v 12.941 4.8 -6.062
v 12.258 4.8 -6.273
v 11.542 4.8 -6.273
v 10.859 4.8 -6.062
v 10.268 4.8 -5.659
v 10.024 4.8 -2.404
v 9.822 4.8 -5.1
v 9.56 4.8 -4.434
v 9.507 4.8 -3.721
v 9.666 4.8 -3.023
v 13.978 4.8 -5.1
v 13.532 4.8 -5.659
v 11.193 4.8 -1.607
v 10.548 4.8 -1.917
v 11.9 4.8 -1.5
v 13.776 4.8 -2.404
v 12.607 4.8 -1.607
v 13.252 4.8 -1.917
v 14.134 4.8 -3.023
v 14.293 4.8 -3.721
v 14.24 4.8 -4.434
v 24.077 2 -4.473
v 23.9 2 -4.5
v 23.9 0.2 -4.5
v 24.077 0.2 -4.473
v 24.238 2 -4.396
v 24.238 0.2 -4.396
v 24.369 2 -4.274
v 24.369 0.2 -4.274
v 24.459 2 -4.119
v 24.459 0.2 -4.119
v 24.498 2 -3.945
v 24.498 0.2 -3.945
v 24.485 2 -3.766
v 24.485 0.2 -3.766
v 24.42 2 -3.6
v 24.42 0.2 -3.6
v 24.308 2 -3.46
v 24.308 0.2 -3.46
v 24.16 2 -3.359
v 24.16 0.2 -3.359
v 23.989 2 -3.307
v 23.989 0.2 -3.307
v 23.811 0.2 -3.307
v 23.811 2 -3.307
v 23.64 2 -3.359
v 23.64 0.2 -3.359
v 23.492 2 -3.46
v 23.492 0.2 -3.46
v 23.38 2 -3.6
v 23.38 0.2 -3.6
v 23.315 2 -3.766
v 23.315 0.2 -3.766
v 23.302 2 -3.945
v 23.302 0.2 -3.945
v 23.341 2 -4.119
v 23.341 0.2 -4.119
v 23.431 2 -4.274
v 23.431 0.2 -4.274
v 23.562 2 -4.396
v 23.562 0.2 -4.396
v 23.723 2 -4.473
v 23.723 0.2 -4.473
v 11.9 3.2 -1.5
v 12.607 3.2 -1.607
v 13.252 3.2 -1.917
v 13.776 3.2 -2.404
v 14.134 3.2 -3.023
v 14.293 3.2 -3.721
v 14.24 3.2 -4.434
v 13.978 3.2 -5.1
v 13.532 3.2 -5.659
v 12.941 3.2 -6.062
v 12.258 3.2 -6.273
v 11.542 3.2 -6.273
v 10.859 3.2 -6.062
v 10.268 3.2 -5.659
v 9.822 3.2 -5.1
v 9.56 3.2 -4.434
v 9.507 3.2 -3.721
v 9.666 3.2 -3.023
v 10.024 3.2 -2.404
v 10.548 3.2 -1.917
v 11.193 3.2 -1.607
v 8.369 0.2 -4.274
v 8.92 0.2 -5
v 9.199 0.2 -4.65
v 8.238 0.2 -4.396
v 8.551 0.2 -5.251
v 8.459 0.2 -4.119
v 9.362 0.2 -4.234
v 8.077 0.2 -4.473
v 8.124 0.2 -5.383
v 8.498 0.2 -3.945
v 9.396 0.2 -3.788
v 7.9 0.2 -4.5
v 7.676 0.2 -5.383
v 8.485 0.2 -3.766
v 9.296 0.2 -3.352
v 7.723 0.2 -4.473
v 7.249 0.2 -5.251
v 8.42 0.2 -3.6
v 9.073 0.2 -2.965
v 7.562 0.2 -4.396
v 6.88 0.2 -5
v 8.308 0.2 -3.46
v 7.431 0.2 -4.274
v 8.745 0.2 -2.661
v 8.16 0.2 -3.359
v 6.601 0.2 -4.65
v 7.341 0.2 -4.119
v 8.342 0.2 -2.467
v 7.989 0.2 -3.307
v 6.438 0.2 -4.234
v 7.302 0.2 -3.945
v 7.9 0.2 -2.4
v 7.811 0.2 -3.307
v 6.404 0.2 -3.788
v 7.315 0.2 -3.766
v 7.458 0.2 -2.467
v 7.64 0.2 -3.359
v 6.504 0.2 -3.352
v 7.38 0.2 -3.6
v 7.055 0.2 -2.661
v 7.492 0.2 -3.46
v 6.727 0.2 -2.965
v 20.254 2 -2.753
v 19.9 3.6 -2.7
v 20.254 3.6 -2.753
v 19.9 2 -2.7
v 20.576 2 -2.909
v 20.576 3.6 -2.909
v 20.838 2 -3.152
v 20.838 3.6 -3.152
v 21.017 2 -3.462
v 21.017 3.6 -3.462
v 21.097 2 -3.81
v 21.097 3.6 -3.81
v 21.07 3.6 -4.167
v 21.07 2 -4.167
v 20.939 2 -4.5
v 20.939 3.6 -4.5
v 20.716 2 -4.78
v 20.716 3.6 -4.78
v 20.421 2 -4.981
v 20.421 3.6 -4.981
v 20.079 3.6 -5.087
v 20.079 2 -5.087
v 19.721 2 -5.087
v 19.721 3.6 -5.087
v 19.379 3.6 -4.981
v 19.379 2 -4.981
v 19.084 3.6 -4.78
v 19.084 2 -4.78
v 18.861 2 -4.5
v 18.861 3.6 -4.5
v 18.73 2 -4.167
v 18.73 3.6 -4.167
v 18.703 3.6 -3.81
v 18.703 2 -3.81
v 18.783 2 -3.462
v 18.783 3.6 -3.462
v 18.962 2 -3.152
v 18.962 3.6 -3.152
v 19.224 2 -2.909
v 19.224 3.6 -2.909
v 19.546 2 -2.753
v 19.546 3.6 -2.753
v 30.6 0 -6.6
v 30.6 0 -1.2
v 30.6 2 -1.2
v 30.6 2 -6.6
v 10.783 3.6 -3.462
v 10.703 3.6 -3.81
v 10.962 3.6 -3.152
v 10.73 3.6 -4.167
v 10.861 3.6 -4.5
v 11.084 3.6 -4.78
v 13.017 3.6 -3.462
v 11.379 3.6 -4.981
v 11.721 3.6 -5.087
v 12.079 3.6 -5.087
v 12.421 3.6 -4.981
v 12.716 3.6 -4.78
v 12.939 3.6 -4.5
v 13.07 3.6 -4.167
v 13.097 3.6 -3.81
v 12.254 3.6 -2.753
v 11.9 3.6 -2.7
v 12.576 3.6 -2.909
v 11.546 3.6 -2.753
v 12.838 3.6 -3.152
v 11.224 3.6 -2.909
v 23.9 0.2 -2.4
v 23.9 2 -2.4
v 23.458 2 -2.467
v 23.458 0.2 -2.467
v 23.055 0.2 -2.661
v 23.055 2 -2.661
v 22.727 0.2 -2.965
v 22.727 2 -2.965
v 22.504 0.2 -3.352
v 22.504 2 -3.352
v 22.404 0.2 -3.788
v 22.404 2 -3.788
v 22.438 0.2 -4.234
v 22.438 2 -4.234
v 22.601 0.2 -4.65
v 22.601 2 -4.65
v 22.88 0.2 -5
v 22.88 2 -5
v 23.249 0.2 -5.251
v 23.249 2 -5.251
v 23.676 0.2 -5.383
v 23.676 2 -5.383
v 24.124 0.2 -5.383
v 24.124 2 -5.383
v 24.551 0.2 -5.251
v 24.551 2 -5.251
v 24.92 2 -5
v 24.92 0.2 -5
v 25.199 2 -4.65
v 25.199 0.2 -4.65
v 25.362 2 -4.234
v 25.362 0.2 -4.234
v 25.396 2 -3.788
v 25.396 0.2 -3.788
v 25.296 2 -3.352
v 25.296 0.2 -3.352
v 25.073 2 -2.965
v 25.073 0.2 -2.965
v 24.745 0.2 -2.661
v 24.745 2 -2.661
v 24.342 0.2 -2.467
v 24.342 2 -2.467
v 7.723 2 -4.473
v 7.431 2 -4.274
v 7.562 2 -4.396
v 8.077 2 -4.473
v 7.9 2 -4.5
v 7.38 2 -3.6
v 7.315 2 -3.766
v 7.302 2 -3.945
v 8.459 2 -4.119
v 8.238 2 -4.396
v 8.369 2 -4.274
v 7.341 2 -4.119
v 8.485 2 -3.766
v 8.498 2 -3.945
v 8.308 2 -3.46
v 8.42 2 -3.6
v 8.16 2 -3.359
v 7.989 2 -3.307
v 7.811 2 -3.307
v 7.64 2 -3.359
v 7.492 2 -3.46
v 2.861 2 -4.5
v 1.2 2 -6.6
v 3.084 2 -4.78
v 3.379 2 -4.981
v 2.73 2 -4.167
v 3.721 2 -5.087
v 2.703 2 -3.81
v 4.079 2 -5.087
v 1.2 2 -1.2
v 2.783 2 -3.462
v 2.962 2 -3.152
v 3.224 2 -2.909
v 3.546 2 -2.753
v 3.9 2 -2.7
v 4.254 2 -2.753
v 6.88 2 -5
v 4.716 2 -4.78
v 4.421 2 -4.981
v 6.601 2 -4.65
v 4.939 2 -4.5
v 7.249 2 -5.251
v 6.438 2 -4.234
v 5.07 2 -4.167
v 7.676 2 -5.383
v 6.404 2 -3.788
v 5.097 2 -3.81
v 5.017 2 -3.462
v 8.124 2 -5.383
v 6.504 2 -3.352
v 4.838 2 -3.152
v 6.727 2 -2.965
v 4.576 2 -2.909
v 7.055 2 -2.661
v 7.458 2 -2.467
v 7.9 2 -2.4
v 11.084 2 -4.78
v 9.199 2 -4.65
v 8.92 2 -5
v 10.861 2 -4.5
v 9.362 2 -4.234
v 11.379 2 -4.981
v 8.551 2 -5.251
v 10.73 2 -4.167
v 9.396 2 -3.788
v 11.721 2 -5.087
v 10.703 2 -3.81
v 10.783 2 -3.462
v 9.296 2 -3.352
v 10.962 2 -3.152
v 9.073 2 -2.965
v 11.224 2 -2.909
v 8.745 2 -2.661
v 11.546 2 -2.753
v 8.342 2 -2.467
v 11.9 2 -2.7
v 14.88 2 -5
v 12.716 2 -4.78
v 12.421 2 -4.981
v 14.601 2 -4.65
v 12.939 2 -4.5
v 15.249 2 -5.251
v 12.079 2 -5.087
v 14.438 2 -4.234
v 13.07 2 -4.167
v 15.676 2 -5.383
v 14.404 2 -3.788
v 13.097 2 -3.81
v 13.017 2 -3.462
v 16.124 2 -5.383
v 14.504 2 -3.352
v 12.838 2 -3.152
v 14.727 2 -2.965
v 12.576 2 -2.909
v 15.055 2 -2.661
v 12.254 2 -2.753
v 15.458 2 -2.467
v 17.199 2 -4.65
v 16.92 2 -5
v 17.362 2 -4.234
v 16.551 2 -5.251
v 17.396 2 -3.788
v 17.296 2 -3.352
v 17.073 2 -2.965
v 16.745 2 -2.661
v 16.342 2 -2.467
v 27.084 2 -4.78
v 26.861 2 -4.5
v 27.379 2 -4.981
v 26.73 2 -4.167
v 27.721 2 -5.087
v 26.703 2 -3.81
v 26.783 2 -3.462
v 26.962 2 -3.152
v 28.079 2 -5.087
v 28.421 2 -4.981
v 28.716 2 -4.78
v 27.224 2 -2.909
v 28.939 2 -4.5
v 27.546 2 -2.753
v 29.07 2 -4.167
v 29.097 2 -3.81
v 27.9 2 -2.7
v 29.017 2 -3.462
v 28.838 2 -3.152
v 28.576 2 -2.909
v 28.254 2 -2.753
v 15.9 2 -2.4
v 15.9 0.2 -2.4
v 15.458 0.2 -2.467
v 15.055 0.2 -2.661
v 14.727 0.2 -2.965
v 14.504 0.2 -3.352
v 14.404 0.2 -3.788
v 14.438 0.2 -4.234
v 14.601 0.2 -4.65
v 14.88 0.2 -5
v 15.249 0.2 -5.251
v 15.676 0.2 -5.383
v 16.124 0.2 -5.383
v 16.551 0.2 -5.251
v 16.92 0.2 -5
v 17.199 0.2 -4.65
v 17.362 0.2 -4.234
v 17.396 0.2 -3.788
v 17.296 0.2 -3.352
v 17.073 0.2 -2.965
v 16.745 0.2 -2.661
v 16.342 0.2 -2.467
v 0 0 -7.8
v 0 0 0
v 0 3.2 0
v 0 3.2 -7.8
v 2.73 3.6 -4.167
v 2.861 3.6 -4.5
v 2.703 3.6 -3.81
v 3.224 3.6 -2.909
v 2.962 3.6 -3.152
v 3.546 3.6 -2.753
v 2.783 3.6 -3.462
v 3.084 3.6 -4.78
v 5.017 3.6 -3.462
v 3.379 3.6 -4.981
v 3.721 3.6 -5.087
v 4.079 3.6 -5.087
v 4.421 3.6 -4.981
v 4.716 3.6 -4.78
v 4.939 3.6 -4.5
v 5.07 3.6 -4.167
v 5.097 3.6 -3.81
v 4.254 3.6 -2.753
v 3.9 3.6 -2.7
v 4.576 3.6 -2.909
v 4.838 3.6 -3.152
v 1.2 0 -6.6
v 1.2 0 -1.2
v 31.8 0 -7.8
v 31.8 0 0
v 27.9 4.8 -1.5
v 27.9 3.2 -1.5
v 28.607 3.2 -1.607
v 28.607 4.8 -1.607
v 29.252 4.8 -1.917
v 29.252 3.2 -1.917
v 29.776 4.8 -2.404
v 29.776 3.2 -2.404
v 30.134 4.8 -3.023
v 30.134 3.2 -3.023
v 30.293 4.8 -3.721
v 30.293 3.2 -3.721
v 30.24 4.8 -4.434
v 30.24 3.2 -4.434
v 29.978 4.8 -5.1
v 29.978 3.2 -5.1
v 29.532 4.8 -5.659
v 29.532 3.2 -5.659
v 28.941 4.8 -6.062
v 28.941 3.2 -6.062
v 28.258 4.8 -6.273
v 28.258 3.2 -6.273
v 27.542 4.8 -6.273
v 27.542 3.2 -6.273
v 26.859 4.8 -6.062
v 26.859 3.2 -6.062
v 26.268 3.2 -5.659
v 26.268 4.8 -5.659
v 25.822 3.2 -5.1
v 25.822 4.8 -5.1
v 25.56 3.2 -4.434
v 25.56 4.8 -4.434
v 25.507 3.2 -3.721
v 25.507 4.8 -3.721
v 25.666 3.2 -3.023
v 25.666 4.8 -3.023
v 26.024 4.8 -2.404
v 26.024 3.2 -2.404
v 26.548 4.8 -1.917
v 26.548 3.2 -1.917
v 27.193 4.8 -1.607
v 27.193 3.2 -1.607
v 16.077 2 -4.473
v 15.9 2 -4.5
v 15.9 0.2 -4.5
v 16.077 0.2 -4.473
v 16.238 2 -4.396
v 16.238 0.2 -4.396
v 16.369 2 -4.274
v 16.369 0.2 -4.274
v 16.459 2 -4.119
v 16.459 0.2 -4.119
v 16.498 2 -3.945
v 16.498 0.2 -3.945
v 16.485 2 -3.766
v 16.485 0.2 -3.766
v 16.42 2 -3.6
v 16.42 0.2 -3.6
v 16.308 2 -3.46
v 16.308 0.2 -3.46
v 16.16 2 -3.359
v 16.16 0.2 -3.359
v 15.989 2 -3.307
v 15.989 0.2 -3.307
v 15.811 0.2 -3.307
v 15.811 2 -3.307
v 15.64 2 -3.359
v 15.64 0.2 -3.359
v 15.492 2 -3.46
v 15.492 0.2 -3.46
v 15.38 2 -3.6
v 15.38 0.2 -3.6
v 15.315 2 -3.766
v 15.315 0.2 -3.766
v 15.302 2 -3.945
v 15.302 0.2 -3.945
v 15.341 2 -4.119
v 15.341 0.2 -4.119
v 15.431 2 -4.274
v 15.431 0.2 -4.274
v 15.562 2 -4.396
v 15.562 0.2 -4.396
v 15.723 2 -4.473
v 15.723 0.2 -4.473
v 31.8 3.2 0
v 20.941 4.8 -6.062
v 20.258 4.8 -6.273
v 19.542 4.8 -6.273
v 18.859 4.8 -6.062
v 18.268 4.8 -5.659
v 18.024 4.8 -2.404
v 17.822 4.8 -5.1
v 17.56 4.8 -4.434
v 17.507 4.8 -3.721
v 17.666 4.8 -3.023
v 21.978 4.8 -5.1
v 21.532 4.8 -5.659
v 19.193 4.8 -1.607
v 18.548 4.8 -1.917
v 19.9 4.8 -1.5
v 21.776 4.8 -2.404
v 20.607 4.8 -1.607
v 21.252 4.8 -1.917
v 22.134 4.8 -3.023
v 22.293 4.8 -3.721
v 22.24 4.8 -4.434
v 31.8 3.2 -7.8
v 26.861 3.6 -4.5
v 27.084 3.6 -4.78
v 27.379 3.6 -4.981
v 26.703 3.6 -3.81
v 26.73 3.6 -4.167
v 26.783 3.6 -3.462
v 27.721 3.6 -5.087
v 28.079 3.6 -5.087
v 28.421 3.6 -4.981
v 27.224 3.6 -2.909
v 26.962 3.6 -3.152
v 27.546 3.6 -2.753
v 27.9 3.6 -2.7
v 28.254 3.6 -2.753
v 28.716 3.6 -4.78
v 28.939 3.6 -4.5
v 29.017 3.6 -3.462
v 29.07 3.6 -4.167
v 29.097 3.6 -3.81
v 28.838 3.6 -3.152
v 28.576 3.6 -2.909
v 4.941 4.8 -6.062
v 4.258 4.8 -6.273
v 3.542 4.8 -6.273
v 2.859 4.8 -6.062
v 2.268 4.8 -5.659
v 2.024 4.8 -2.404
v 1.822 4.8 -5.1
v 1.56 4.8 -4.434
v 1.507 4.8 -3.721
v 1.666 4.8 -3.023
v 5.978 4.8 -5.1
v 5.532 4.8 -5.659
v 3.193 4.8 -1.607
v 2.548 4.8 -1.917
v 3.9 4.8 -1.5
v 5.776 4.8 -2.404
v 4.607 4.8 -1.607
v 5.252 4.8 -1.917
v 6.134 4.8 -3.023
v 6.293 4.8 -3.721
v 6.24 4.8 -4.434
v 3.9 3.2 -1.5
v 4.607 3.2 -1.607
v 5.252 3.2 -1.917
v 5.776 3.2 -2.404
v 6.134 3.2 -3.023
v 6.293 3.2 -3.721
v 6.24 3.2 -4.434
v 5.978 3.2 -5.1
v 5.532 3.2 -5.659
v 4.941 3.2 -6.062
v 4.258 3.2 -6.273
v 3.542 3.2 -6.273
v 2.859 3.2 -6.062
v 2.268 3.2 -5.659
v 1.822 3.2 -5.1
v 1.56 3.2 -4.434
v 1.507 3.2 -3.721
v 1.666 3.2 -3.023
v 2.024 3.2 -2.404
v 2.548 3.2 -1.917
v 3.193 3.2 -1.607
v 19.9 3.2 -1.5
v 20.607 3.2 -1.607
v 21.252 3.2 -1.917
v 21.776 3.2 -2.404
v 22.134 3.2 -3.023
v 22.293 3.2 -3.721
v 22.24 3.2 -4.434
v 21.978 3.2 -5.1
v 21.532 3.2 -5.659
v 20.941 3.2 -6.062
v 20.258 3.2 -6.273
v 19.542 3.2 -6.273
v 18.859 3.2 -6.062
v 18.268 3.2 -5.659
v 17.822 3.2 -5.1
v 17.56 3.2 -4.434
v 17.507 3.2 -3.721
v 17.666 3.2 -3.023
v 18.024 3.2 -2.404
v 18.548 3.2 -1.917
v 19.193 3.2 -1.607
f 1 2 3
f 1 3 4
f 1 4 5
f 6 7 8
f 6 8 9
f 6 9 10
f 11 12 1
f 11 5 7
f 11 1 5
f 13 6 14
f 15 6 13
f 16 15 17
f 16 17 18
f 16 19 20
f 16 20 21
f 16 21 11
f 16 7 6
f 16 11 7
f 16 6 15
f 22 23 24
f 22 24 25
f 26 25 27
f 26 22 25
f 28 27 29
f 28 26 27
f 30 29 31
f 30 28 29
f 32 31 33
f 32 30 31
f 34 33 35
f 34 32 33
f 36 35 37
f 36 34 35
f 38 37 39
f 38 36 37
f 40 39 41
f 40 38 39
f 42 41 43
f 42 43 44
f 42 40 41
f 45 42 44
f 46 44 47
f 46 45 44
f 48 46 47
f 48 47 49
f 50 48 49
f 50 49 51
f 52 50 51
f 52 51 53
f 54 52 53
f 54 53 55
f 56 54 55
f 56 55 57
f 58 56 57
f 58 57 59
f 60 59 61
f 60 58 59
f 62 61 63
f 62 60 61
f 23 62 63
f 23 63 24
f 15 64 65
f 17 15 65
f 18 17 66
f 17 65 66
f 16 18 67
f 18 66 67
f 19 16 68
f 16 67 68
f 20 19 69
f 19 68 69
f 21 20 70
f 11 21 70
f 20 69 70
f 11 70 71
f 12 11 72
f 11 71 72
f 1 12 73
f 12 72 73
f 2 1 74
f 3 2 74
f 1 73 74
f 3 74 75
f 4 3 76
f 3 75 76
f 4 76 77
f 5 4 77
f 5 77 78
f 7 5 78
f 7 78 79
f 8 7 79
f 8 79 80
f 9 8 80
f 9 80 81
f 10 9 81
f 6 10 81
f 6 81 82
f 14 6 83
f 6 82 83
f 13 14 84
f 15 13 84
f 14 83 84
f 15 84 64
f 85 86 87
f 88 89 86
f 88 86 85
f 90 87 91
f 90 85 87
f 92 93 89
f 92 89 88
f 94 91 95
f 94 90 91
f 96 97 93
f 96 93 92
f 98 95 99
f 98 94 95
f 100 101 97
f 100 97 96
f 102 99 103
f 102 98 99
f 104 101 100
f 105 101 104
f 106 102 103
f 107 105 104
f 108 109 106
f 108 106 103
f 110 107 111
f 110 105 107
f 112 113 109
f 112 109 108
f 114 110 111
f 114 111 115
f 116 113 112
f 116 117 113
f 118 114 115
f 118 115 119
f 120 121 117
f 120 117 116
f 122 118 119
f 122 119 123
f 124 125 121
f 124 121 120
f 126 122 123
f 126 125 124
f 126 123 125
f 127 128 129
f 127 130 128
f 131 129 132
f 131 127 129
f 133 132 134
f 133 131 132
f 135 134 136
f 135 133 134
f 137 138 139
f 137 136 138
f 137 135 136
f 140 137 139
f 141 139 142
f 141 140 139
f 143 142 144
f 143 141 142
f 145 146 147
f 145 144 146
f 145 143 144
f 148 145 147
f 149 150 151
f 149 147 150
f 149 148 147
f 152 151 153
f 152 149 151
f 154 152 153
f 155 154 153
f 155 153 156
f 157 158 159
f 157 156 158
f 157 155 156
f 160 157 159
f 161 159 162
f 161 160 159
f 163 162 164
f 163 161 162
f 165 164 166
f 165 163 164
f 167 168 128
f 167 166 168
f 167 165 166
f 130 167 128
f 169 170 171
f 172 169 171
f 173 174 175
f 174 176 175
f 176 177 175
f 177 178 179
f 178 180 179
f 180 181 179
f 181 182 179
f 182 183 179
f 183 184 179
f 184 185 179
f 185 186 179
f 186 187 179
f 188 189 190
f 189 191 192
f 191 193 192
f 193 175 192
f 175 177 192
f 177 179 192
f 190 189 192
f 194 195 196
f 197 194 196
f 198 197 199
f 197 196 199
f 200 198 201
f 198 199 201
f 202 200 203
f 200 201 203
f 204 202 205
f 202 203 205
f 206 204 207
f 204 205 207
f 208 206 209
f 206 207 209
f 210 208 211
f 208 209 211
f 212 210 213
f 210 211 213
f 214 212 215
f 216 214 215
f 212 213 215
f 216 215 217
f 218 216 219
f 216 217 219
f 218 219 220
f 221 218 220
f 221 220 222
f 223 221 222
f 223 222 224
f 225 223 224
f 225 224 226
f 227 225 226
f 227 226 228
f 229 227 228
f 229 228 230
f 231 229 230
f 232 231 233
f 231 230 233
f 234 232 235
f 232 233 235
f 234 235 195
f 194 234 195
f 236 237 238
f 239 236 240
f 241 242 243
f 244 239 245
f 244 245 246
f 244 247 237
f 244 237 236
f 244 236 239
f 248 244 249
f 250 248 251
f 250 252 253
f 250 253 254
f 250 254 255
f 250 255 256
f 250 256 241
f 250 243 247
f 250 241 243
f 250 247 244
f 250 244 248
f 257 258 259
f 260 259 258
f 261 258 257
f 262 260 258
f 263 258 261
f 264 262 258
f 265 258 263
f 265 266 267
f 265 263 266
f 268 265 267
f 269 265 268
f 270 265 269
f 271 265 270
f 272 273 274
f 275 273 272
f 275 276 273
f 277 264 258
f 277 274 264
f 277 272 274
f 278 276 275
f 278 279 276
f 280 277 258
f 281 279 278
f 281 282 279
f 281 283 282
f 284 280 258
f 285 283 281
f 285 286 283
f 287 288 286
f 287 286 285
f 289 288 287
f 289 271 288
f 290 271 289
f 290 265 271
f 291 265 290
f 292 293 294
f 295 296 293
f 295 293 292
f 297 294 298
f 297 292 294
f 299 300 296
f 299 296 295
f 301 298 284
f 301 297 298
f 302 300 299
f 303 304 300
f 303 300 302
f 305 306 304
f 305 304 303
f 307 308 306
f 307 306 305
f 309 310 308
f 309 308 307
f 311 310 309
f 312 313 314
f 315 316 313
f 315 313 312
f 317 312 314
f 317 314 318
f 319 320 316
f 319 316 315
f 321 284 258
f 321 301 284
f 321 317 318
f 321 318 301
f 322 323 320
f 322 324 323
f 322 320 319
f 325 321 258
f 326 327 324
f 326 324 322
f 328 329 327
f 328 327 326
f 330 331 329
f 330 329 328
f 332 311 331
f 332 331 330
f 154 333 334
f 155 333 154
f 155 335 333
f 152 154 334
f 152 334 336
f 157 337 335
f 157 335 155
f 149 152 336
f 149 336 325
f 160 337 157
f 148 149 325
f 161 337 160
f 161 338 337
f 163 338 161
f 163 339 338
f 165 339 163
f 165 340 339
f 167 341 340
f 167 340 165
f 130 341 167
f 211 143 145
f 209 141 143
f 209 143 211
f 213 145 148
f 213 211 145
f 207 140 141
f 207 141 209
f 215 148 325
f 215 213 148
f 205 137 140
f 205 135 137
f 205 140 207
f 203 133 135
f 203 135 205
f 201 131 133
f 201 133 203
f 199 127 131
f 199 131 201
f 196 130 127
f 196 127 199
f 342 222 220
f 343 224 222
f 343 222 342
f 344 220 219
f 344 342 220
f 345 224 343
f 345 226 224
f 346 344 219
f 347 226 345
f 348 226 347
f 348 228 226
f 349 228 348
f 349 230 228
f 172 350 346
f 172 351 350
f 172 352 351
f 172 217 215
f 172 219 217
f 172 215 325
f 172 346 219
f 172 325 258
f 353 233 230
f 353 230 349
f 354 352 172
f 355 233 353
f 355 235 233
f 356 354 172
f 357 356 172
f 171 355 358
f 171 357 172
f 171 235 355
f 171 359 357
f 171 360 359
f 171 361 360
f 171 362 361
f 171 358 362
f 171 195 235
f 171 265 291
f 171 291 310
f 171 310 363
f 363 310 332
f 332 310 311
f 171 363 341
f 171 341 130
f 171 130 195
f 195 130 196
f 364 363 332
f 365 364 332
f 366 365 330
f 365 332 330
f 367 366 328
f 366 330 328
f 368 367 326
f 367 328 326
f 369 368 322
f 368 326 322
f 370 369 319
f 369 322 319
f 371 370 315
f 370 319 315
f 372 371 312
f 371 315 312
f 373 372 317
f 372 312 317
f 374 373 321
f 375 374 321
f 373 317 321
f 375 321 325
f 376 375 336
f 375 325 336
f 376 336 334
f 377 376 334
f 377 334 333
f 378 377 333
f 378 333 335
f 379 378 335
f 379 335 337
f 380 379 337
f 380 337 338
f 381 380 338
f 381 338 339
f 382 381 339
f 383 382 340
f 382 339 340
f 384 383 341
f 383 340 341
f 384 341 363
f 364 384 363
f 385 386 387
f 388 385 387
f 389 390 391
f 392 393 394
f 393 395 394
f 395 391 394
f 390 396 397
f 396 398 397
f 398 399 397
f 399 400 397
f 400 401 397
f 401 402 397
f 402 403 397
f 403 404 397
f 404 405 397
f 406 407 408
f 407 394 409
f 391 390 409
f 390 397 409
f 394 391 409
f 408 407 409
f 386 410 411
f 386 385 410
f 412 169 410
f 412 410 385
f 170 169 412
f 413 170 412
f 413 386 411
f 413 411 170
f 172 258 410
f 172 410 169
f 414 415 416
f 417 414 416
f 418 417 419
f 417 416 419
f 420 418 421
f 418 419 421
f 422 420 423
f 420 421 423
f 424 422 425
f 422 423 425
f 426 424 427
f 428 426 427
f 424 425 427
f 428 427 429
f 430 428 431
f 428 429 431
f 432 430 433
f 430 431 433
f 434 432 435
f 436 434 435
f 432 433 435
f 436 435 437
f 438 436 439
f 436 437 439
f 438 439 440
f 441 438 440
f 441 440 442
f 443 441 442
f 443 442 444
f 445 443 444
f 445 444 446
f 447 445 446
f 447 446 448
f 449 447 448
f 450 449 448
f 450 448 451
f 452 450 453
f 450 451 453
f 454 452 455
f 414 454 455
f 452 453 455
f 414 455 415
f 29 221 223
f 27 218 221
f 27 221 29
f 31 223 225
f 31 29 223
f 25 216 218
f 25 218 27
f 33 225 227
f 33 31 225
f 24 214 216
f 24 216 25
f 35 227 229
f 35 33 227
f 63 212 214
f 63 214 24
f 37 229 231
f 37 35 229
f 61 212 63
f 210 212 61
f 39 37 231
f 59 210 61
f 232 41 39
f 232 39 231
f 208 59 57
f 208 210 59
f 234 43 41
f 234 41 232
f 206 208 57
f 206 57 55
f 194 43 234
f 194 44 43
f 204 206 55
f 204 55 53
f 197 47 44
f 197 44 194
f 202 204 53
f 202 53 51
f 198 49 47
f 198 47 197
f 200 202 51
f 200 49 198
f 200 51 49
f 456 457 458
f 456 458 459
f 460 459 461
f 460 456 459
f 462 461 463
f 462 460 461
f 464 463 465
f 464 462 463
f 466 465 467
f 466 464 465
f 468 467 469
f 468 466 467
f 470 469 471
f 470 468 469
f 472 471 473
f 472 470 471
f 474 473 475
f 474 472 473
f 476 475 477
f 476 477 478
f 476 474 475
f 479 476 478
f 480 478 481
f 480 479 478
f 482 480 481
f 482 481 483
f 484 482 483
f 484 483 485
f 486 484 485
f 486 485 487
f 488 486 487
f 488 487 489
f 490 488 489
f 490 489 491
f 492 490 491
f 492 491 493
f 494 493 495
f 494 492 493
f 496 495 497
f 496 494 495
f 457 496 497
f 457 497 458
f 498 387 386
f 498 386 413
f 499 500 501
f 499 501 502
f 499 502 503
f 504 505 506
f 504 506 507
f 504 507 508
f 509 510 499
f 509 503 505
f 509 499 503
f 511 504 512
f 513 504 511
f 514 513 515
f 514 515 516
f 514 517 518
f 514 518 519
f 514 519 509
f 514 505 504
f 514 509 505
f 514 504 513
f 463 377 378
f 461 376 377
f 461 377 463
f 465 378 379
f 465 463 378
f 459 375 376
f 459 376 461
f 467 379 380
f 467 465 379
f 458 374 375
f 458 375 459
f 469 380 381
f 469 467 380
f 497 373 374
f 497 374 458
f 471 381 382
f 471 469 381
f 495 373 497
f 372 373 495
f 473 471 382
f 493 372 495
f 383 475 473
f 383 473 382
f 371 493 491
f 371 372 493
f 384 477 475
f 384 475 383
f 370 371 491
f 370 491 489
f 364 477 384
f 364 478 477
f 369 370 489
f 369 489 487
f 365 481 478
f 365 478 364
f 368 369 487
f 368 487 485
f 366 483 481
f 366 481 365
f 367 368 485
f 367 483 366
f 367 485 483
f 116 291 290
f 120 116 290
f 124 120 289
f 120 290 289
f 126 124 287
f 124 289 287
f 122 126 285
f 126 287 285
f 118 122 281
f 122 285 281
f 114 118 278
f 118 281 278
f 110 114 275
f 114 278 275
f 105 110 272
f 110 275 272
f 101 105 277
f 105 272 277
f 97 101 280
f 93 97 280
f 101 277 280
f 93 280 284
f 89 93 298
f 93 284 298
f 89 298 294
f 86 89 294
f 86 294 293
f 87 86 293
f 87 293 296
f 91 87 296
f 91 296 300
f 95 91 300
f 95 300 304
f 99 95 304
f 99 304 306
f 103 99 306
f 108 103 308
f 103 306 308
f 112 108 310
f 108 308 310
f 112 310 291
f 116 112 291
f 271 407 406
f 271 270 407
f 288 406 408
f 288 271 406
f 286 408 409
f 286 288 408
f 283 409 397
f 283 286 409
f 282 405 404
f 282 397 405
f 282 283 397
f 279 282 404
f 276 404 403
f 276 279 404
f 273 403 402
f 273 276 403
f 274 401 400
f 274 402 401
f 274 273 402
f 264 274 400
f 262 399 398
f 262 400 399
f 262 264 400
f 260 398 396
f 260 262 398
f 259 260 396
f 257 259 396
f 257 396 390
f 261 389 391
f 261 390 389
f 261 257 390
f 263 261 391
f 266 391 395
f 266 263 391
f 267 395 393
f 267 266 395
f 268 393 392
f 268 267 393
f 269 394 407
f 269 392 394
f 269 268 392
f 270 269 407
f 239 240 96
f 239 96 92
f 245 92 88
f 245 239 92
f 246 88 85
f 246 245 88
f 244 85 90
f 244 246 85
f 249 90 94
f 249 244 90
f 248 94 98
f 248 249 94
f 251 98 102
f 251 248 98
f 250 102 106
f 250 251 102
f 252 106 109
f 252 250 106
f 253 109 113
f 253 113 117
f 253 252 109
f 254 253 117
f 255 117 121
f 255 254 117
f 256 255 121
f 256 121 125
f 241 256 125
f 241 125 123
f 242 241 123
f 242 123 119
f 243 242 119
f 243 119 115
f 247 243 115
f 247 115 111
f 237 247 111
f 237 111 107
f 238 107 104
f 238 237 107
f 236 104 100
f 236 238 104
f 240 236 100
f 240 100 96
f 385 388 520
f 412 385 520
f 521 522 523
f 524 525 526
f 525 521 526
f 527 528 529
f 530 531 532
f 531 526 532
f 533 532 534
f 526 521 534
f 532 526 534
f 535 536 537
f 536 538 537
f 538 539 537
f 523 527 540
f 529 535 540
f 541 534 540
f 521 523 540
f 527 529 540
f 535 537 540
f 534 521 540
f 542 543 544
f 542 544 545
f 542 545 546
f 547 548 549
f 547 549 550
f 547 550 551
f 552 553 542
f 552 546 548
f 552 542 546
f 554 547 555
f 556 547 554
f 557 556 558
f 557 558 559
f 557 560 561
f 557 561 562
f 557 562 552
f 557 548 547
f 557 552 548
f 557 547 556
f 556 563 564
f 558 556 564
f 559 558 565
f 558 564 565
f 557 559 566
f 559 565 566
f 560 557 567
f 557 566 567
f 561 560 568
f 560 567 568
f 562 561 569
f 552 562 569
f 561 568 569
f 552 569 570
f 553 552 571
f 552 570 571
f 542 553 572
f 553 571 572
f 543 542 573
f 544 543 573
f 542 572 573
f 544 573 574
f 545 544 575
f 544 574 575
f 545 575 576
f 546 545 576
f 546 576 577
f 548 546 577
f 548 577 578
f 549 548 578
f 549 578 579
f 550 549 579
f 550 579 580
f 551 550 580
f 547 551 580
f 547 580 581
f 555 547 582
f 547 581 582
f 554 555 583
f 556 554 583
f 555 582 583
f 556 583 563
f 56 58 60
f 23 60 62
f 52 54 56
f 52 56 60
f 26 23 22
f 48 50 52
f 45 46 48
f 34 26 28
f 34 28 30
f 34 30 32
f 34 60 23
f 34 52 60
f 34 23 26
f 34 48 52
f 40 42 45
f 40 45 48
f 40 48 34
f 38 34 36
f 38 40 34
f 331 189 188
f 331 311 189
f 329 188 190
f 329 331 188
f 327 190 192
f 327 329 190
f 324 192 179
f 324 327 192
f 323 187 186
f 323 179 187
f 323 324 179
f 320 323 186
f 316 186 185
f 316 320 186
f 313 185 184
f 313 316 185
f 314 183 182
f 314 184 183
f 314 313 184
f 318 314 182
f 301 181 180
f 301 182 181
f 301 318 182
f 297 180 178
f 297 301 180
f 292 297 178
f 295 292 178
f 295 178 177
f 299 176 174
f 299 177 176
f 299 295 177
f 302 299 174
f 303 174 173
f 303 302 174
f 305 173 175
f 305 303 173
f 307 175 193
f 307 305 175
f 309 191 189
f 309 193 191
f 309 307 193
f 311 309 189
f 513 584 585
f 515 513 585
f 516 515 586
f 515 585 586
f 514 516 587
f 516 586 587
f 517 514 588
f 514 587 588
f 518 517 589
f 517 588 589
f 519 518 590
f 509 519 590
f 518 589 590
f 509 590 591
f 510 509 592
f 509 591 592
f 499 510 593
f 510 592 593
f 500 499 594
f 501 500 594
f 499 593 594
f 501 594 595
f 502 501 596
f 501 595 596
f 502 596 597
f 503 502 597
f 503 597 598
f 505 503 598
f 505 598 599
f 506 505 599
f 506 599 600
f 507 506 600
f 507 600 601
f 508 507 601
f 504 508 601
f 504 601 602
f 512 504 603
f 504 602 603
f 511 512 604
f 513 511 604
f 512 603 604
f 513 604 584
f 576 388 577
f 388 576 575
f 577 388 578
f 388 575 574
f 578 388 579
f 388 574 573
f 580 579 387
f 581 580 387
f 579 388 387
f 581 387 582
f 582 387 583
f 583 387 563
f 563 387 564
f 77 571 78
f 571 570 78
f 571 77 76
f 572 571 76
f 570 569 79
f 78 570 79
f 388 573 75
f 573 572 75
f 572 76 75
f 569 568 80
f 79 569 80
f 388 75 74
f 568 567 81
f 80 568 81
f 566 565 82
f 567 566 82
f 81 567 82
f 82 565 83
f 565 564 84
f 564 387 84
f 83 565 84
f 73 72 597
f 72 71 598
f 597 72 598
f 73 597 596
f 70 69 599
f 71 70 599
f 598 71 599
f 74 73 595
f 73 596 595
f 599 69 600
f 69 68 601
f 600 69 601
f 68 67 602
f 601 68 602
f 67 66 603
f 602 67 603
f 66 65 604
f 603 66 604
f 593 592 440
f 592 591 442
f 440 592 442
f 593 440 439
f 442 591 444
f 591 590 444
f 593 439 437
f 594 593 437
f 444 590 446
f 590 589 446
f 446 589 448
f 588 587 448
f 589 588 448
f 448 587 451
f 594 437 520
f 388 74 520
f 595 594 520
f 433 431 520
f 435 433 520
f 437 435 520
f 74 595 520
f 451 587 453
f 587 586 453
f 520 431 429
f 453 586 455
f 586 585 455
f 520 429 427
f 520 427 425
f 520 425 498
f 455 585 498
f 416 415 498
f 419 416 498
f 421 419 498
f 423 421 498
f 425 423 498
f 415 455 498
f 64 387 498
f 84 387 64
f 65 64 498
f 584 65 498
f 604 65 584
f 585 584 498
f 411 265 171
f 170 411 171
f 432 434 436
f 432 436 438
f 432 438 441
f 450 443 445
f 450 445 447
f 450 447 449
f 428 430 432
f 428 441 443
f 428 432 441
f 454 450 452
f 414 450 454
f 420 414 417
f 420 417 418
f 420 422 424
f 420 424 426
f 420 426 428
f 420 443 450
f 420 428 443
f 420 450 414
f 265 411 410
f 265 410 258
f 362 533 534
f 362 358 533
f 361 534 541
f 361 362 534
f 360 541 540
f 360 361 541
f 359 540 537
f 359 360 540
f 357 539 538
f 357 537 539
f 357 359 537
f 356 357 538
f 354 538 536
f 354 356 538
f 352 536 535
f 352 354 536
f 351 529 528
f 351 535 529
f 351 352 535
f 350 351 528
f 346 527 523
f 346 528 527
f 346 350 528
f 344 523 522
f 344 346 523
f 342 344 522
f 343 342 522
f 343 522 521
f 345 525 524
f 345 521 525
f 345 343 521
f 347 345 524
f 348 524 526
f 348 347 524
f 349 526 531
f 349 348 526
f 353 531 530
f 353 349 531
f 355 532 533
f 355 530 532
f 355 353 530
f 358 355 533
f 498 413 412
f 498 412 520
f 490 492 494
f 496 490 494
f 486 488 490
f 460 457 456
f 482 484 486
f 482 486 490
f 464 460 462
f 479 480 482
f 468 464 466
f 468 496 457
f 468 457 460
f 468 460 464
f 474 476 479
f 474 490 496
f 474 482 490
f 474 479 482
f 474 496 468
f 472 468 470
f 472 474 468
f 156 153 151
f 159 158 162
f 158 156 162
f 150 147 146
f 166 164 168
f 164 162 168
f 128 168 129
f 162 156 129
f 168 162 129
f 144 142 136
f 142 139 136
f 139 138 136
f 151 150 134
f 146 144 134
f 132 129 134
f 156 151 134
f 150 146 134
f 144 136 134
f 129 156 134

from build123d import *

# Parameters (mm, degrees)
SKETCH1_W            = 31.8
SKETCH1_H            = 3.2
BOSS_EXTRUDE1_DEPTH  = 7.8
SKETCH2_R            = 2.4
BOSS_EXTRUDE2_DEPTH  = 1.6
LPATTERN1_COUNT      = 2
LPATTERN1_PITCH      = 8
LPATTERN1_COUNT_DIR2 = 6
LPATTERN1_PITCH_DIR2 = 8
SHELL1_T             = -1.2
SKETCH3_R            = 1.5
SKETCH3_R_2          = 0.6
BOSS_EXTRUDE3_DEPTH  = 1.8
LPATTERN2_COUNT      = 3
LPATTERN2_PITCH      = 8


with BuildPart() as part:
    # Sketch1 → Boss-Extrude1 (new body)
    with BuildSketch(Plane.XY):
        with Locations((15.9, 1.6)):
            Rectangle(SKETCH1_W, SKETCH1_H)
    extrude(amount=-BOSS_EXTRUDE1_DEPTH)

    # Sketch2 → Boss-Extrude2 (add)
    with BuildSketch(Plane(origin=(0, 3.2, 0), x_dir=(1, 0, 0), z_dir=(0, 1, 0))):
        with Locations(Location((3.9, 3.9, 0), (0, 0, 270))):
            Circle(SKETCH2_R)
    boss_extrude2 = extrude(amount=BOSS_EXTRUDE2_DEPTH)

    # LPattern1: Boss-Extrude2 2 × 6, 8 skipped
    with Locations(*[(j * LPATTERN1_PITCH_DIR2, 0, i * LPATTERN1_PITCH) for i in range(LPATTERN1_COUNT) for j in range(LPATTERN1_COUNT_DIR2) if (i, j) not in ((0, 0), (0, 4), (0, 5), (1, 0), (1, 1), (1, 2), (1, 3), (1, 4), (1, 5))]):
        add(boss_extrude2)

    # Shell1
    shell1_openings = [part.faces().sort_by_distance(p)[0] for p in [
        (15.9, 0, -3.9),
    ]]
    offset(amount=SHELL1_T, openings=shell1_openings, kind=Kind.INTERSECTION)

    # Sketch3 → Boss-Extrude3 (add)
    with BuildSketch(Plane.XZ.offset(-2)):
        with Locations(Location((23.9, -3.9, 0), (0, 0, 90))):
            Circle(SKETCH3_R)
        with Locations(Location((23.9, -3.9, 0), (0, 0, 270))):
            Circle(SKETCH3_R_2, mode=Mode.SUBTRACT)
    boss_extrude3 = extrude(amount=BOSS_EXTRUDE3_DEPTH)

    # LPattern2: Boss-Extrude3 ×3
    with Locations(*[(-i * LPATTERN2_PITCH, 0, 0) for i in range(1, LPATTERN2_COUNT)]):
        add(boss_extrude3)


solid = part.part
